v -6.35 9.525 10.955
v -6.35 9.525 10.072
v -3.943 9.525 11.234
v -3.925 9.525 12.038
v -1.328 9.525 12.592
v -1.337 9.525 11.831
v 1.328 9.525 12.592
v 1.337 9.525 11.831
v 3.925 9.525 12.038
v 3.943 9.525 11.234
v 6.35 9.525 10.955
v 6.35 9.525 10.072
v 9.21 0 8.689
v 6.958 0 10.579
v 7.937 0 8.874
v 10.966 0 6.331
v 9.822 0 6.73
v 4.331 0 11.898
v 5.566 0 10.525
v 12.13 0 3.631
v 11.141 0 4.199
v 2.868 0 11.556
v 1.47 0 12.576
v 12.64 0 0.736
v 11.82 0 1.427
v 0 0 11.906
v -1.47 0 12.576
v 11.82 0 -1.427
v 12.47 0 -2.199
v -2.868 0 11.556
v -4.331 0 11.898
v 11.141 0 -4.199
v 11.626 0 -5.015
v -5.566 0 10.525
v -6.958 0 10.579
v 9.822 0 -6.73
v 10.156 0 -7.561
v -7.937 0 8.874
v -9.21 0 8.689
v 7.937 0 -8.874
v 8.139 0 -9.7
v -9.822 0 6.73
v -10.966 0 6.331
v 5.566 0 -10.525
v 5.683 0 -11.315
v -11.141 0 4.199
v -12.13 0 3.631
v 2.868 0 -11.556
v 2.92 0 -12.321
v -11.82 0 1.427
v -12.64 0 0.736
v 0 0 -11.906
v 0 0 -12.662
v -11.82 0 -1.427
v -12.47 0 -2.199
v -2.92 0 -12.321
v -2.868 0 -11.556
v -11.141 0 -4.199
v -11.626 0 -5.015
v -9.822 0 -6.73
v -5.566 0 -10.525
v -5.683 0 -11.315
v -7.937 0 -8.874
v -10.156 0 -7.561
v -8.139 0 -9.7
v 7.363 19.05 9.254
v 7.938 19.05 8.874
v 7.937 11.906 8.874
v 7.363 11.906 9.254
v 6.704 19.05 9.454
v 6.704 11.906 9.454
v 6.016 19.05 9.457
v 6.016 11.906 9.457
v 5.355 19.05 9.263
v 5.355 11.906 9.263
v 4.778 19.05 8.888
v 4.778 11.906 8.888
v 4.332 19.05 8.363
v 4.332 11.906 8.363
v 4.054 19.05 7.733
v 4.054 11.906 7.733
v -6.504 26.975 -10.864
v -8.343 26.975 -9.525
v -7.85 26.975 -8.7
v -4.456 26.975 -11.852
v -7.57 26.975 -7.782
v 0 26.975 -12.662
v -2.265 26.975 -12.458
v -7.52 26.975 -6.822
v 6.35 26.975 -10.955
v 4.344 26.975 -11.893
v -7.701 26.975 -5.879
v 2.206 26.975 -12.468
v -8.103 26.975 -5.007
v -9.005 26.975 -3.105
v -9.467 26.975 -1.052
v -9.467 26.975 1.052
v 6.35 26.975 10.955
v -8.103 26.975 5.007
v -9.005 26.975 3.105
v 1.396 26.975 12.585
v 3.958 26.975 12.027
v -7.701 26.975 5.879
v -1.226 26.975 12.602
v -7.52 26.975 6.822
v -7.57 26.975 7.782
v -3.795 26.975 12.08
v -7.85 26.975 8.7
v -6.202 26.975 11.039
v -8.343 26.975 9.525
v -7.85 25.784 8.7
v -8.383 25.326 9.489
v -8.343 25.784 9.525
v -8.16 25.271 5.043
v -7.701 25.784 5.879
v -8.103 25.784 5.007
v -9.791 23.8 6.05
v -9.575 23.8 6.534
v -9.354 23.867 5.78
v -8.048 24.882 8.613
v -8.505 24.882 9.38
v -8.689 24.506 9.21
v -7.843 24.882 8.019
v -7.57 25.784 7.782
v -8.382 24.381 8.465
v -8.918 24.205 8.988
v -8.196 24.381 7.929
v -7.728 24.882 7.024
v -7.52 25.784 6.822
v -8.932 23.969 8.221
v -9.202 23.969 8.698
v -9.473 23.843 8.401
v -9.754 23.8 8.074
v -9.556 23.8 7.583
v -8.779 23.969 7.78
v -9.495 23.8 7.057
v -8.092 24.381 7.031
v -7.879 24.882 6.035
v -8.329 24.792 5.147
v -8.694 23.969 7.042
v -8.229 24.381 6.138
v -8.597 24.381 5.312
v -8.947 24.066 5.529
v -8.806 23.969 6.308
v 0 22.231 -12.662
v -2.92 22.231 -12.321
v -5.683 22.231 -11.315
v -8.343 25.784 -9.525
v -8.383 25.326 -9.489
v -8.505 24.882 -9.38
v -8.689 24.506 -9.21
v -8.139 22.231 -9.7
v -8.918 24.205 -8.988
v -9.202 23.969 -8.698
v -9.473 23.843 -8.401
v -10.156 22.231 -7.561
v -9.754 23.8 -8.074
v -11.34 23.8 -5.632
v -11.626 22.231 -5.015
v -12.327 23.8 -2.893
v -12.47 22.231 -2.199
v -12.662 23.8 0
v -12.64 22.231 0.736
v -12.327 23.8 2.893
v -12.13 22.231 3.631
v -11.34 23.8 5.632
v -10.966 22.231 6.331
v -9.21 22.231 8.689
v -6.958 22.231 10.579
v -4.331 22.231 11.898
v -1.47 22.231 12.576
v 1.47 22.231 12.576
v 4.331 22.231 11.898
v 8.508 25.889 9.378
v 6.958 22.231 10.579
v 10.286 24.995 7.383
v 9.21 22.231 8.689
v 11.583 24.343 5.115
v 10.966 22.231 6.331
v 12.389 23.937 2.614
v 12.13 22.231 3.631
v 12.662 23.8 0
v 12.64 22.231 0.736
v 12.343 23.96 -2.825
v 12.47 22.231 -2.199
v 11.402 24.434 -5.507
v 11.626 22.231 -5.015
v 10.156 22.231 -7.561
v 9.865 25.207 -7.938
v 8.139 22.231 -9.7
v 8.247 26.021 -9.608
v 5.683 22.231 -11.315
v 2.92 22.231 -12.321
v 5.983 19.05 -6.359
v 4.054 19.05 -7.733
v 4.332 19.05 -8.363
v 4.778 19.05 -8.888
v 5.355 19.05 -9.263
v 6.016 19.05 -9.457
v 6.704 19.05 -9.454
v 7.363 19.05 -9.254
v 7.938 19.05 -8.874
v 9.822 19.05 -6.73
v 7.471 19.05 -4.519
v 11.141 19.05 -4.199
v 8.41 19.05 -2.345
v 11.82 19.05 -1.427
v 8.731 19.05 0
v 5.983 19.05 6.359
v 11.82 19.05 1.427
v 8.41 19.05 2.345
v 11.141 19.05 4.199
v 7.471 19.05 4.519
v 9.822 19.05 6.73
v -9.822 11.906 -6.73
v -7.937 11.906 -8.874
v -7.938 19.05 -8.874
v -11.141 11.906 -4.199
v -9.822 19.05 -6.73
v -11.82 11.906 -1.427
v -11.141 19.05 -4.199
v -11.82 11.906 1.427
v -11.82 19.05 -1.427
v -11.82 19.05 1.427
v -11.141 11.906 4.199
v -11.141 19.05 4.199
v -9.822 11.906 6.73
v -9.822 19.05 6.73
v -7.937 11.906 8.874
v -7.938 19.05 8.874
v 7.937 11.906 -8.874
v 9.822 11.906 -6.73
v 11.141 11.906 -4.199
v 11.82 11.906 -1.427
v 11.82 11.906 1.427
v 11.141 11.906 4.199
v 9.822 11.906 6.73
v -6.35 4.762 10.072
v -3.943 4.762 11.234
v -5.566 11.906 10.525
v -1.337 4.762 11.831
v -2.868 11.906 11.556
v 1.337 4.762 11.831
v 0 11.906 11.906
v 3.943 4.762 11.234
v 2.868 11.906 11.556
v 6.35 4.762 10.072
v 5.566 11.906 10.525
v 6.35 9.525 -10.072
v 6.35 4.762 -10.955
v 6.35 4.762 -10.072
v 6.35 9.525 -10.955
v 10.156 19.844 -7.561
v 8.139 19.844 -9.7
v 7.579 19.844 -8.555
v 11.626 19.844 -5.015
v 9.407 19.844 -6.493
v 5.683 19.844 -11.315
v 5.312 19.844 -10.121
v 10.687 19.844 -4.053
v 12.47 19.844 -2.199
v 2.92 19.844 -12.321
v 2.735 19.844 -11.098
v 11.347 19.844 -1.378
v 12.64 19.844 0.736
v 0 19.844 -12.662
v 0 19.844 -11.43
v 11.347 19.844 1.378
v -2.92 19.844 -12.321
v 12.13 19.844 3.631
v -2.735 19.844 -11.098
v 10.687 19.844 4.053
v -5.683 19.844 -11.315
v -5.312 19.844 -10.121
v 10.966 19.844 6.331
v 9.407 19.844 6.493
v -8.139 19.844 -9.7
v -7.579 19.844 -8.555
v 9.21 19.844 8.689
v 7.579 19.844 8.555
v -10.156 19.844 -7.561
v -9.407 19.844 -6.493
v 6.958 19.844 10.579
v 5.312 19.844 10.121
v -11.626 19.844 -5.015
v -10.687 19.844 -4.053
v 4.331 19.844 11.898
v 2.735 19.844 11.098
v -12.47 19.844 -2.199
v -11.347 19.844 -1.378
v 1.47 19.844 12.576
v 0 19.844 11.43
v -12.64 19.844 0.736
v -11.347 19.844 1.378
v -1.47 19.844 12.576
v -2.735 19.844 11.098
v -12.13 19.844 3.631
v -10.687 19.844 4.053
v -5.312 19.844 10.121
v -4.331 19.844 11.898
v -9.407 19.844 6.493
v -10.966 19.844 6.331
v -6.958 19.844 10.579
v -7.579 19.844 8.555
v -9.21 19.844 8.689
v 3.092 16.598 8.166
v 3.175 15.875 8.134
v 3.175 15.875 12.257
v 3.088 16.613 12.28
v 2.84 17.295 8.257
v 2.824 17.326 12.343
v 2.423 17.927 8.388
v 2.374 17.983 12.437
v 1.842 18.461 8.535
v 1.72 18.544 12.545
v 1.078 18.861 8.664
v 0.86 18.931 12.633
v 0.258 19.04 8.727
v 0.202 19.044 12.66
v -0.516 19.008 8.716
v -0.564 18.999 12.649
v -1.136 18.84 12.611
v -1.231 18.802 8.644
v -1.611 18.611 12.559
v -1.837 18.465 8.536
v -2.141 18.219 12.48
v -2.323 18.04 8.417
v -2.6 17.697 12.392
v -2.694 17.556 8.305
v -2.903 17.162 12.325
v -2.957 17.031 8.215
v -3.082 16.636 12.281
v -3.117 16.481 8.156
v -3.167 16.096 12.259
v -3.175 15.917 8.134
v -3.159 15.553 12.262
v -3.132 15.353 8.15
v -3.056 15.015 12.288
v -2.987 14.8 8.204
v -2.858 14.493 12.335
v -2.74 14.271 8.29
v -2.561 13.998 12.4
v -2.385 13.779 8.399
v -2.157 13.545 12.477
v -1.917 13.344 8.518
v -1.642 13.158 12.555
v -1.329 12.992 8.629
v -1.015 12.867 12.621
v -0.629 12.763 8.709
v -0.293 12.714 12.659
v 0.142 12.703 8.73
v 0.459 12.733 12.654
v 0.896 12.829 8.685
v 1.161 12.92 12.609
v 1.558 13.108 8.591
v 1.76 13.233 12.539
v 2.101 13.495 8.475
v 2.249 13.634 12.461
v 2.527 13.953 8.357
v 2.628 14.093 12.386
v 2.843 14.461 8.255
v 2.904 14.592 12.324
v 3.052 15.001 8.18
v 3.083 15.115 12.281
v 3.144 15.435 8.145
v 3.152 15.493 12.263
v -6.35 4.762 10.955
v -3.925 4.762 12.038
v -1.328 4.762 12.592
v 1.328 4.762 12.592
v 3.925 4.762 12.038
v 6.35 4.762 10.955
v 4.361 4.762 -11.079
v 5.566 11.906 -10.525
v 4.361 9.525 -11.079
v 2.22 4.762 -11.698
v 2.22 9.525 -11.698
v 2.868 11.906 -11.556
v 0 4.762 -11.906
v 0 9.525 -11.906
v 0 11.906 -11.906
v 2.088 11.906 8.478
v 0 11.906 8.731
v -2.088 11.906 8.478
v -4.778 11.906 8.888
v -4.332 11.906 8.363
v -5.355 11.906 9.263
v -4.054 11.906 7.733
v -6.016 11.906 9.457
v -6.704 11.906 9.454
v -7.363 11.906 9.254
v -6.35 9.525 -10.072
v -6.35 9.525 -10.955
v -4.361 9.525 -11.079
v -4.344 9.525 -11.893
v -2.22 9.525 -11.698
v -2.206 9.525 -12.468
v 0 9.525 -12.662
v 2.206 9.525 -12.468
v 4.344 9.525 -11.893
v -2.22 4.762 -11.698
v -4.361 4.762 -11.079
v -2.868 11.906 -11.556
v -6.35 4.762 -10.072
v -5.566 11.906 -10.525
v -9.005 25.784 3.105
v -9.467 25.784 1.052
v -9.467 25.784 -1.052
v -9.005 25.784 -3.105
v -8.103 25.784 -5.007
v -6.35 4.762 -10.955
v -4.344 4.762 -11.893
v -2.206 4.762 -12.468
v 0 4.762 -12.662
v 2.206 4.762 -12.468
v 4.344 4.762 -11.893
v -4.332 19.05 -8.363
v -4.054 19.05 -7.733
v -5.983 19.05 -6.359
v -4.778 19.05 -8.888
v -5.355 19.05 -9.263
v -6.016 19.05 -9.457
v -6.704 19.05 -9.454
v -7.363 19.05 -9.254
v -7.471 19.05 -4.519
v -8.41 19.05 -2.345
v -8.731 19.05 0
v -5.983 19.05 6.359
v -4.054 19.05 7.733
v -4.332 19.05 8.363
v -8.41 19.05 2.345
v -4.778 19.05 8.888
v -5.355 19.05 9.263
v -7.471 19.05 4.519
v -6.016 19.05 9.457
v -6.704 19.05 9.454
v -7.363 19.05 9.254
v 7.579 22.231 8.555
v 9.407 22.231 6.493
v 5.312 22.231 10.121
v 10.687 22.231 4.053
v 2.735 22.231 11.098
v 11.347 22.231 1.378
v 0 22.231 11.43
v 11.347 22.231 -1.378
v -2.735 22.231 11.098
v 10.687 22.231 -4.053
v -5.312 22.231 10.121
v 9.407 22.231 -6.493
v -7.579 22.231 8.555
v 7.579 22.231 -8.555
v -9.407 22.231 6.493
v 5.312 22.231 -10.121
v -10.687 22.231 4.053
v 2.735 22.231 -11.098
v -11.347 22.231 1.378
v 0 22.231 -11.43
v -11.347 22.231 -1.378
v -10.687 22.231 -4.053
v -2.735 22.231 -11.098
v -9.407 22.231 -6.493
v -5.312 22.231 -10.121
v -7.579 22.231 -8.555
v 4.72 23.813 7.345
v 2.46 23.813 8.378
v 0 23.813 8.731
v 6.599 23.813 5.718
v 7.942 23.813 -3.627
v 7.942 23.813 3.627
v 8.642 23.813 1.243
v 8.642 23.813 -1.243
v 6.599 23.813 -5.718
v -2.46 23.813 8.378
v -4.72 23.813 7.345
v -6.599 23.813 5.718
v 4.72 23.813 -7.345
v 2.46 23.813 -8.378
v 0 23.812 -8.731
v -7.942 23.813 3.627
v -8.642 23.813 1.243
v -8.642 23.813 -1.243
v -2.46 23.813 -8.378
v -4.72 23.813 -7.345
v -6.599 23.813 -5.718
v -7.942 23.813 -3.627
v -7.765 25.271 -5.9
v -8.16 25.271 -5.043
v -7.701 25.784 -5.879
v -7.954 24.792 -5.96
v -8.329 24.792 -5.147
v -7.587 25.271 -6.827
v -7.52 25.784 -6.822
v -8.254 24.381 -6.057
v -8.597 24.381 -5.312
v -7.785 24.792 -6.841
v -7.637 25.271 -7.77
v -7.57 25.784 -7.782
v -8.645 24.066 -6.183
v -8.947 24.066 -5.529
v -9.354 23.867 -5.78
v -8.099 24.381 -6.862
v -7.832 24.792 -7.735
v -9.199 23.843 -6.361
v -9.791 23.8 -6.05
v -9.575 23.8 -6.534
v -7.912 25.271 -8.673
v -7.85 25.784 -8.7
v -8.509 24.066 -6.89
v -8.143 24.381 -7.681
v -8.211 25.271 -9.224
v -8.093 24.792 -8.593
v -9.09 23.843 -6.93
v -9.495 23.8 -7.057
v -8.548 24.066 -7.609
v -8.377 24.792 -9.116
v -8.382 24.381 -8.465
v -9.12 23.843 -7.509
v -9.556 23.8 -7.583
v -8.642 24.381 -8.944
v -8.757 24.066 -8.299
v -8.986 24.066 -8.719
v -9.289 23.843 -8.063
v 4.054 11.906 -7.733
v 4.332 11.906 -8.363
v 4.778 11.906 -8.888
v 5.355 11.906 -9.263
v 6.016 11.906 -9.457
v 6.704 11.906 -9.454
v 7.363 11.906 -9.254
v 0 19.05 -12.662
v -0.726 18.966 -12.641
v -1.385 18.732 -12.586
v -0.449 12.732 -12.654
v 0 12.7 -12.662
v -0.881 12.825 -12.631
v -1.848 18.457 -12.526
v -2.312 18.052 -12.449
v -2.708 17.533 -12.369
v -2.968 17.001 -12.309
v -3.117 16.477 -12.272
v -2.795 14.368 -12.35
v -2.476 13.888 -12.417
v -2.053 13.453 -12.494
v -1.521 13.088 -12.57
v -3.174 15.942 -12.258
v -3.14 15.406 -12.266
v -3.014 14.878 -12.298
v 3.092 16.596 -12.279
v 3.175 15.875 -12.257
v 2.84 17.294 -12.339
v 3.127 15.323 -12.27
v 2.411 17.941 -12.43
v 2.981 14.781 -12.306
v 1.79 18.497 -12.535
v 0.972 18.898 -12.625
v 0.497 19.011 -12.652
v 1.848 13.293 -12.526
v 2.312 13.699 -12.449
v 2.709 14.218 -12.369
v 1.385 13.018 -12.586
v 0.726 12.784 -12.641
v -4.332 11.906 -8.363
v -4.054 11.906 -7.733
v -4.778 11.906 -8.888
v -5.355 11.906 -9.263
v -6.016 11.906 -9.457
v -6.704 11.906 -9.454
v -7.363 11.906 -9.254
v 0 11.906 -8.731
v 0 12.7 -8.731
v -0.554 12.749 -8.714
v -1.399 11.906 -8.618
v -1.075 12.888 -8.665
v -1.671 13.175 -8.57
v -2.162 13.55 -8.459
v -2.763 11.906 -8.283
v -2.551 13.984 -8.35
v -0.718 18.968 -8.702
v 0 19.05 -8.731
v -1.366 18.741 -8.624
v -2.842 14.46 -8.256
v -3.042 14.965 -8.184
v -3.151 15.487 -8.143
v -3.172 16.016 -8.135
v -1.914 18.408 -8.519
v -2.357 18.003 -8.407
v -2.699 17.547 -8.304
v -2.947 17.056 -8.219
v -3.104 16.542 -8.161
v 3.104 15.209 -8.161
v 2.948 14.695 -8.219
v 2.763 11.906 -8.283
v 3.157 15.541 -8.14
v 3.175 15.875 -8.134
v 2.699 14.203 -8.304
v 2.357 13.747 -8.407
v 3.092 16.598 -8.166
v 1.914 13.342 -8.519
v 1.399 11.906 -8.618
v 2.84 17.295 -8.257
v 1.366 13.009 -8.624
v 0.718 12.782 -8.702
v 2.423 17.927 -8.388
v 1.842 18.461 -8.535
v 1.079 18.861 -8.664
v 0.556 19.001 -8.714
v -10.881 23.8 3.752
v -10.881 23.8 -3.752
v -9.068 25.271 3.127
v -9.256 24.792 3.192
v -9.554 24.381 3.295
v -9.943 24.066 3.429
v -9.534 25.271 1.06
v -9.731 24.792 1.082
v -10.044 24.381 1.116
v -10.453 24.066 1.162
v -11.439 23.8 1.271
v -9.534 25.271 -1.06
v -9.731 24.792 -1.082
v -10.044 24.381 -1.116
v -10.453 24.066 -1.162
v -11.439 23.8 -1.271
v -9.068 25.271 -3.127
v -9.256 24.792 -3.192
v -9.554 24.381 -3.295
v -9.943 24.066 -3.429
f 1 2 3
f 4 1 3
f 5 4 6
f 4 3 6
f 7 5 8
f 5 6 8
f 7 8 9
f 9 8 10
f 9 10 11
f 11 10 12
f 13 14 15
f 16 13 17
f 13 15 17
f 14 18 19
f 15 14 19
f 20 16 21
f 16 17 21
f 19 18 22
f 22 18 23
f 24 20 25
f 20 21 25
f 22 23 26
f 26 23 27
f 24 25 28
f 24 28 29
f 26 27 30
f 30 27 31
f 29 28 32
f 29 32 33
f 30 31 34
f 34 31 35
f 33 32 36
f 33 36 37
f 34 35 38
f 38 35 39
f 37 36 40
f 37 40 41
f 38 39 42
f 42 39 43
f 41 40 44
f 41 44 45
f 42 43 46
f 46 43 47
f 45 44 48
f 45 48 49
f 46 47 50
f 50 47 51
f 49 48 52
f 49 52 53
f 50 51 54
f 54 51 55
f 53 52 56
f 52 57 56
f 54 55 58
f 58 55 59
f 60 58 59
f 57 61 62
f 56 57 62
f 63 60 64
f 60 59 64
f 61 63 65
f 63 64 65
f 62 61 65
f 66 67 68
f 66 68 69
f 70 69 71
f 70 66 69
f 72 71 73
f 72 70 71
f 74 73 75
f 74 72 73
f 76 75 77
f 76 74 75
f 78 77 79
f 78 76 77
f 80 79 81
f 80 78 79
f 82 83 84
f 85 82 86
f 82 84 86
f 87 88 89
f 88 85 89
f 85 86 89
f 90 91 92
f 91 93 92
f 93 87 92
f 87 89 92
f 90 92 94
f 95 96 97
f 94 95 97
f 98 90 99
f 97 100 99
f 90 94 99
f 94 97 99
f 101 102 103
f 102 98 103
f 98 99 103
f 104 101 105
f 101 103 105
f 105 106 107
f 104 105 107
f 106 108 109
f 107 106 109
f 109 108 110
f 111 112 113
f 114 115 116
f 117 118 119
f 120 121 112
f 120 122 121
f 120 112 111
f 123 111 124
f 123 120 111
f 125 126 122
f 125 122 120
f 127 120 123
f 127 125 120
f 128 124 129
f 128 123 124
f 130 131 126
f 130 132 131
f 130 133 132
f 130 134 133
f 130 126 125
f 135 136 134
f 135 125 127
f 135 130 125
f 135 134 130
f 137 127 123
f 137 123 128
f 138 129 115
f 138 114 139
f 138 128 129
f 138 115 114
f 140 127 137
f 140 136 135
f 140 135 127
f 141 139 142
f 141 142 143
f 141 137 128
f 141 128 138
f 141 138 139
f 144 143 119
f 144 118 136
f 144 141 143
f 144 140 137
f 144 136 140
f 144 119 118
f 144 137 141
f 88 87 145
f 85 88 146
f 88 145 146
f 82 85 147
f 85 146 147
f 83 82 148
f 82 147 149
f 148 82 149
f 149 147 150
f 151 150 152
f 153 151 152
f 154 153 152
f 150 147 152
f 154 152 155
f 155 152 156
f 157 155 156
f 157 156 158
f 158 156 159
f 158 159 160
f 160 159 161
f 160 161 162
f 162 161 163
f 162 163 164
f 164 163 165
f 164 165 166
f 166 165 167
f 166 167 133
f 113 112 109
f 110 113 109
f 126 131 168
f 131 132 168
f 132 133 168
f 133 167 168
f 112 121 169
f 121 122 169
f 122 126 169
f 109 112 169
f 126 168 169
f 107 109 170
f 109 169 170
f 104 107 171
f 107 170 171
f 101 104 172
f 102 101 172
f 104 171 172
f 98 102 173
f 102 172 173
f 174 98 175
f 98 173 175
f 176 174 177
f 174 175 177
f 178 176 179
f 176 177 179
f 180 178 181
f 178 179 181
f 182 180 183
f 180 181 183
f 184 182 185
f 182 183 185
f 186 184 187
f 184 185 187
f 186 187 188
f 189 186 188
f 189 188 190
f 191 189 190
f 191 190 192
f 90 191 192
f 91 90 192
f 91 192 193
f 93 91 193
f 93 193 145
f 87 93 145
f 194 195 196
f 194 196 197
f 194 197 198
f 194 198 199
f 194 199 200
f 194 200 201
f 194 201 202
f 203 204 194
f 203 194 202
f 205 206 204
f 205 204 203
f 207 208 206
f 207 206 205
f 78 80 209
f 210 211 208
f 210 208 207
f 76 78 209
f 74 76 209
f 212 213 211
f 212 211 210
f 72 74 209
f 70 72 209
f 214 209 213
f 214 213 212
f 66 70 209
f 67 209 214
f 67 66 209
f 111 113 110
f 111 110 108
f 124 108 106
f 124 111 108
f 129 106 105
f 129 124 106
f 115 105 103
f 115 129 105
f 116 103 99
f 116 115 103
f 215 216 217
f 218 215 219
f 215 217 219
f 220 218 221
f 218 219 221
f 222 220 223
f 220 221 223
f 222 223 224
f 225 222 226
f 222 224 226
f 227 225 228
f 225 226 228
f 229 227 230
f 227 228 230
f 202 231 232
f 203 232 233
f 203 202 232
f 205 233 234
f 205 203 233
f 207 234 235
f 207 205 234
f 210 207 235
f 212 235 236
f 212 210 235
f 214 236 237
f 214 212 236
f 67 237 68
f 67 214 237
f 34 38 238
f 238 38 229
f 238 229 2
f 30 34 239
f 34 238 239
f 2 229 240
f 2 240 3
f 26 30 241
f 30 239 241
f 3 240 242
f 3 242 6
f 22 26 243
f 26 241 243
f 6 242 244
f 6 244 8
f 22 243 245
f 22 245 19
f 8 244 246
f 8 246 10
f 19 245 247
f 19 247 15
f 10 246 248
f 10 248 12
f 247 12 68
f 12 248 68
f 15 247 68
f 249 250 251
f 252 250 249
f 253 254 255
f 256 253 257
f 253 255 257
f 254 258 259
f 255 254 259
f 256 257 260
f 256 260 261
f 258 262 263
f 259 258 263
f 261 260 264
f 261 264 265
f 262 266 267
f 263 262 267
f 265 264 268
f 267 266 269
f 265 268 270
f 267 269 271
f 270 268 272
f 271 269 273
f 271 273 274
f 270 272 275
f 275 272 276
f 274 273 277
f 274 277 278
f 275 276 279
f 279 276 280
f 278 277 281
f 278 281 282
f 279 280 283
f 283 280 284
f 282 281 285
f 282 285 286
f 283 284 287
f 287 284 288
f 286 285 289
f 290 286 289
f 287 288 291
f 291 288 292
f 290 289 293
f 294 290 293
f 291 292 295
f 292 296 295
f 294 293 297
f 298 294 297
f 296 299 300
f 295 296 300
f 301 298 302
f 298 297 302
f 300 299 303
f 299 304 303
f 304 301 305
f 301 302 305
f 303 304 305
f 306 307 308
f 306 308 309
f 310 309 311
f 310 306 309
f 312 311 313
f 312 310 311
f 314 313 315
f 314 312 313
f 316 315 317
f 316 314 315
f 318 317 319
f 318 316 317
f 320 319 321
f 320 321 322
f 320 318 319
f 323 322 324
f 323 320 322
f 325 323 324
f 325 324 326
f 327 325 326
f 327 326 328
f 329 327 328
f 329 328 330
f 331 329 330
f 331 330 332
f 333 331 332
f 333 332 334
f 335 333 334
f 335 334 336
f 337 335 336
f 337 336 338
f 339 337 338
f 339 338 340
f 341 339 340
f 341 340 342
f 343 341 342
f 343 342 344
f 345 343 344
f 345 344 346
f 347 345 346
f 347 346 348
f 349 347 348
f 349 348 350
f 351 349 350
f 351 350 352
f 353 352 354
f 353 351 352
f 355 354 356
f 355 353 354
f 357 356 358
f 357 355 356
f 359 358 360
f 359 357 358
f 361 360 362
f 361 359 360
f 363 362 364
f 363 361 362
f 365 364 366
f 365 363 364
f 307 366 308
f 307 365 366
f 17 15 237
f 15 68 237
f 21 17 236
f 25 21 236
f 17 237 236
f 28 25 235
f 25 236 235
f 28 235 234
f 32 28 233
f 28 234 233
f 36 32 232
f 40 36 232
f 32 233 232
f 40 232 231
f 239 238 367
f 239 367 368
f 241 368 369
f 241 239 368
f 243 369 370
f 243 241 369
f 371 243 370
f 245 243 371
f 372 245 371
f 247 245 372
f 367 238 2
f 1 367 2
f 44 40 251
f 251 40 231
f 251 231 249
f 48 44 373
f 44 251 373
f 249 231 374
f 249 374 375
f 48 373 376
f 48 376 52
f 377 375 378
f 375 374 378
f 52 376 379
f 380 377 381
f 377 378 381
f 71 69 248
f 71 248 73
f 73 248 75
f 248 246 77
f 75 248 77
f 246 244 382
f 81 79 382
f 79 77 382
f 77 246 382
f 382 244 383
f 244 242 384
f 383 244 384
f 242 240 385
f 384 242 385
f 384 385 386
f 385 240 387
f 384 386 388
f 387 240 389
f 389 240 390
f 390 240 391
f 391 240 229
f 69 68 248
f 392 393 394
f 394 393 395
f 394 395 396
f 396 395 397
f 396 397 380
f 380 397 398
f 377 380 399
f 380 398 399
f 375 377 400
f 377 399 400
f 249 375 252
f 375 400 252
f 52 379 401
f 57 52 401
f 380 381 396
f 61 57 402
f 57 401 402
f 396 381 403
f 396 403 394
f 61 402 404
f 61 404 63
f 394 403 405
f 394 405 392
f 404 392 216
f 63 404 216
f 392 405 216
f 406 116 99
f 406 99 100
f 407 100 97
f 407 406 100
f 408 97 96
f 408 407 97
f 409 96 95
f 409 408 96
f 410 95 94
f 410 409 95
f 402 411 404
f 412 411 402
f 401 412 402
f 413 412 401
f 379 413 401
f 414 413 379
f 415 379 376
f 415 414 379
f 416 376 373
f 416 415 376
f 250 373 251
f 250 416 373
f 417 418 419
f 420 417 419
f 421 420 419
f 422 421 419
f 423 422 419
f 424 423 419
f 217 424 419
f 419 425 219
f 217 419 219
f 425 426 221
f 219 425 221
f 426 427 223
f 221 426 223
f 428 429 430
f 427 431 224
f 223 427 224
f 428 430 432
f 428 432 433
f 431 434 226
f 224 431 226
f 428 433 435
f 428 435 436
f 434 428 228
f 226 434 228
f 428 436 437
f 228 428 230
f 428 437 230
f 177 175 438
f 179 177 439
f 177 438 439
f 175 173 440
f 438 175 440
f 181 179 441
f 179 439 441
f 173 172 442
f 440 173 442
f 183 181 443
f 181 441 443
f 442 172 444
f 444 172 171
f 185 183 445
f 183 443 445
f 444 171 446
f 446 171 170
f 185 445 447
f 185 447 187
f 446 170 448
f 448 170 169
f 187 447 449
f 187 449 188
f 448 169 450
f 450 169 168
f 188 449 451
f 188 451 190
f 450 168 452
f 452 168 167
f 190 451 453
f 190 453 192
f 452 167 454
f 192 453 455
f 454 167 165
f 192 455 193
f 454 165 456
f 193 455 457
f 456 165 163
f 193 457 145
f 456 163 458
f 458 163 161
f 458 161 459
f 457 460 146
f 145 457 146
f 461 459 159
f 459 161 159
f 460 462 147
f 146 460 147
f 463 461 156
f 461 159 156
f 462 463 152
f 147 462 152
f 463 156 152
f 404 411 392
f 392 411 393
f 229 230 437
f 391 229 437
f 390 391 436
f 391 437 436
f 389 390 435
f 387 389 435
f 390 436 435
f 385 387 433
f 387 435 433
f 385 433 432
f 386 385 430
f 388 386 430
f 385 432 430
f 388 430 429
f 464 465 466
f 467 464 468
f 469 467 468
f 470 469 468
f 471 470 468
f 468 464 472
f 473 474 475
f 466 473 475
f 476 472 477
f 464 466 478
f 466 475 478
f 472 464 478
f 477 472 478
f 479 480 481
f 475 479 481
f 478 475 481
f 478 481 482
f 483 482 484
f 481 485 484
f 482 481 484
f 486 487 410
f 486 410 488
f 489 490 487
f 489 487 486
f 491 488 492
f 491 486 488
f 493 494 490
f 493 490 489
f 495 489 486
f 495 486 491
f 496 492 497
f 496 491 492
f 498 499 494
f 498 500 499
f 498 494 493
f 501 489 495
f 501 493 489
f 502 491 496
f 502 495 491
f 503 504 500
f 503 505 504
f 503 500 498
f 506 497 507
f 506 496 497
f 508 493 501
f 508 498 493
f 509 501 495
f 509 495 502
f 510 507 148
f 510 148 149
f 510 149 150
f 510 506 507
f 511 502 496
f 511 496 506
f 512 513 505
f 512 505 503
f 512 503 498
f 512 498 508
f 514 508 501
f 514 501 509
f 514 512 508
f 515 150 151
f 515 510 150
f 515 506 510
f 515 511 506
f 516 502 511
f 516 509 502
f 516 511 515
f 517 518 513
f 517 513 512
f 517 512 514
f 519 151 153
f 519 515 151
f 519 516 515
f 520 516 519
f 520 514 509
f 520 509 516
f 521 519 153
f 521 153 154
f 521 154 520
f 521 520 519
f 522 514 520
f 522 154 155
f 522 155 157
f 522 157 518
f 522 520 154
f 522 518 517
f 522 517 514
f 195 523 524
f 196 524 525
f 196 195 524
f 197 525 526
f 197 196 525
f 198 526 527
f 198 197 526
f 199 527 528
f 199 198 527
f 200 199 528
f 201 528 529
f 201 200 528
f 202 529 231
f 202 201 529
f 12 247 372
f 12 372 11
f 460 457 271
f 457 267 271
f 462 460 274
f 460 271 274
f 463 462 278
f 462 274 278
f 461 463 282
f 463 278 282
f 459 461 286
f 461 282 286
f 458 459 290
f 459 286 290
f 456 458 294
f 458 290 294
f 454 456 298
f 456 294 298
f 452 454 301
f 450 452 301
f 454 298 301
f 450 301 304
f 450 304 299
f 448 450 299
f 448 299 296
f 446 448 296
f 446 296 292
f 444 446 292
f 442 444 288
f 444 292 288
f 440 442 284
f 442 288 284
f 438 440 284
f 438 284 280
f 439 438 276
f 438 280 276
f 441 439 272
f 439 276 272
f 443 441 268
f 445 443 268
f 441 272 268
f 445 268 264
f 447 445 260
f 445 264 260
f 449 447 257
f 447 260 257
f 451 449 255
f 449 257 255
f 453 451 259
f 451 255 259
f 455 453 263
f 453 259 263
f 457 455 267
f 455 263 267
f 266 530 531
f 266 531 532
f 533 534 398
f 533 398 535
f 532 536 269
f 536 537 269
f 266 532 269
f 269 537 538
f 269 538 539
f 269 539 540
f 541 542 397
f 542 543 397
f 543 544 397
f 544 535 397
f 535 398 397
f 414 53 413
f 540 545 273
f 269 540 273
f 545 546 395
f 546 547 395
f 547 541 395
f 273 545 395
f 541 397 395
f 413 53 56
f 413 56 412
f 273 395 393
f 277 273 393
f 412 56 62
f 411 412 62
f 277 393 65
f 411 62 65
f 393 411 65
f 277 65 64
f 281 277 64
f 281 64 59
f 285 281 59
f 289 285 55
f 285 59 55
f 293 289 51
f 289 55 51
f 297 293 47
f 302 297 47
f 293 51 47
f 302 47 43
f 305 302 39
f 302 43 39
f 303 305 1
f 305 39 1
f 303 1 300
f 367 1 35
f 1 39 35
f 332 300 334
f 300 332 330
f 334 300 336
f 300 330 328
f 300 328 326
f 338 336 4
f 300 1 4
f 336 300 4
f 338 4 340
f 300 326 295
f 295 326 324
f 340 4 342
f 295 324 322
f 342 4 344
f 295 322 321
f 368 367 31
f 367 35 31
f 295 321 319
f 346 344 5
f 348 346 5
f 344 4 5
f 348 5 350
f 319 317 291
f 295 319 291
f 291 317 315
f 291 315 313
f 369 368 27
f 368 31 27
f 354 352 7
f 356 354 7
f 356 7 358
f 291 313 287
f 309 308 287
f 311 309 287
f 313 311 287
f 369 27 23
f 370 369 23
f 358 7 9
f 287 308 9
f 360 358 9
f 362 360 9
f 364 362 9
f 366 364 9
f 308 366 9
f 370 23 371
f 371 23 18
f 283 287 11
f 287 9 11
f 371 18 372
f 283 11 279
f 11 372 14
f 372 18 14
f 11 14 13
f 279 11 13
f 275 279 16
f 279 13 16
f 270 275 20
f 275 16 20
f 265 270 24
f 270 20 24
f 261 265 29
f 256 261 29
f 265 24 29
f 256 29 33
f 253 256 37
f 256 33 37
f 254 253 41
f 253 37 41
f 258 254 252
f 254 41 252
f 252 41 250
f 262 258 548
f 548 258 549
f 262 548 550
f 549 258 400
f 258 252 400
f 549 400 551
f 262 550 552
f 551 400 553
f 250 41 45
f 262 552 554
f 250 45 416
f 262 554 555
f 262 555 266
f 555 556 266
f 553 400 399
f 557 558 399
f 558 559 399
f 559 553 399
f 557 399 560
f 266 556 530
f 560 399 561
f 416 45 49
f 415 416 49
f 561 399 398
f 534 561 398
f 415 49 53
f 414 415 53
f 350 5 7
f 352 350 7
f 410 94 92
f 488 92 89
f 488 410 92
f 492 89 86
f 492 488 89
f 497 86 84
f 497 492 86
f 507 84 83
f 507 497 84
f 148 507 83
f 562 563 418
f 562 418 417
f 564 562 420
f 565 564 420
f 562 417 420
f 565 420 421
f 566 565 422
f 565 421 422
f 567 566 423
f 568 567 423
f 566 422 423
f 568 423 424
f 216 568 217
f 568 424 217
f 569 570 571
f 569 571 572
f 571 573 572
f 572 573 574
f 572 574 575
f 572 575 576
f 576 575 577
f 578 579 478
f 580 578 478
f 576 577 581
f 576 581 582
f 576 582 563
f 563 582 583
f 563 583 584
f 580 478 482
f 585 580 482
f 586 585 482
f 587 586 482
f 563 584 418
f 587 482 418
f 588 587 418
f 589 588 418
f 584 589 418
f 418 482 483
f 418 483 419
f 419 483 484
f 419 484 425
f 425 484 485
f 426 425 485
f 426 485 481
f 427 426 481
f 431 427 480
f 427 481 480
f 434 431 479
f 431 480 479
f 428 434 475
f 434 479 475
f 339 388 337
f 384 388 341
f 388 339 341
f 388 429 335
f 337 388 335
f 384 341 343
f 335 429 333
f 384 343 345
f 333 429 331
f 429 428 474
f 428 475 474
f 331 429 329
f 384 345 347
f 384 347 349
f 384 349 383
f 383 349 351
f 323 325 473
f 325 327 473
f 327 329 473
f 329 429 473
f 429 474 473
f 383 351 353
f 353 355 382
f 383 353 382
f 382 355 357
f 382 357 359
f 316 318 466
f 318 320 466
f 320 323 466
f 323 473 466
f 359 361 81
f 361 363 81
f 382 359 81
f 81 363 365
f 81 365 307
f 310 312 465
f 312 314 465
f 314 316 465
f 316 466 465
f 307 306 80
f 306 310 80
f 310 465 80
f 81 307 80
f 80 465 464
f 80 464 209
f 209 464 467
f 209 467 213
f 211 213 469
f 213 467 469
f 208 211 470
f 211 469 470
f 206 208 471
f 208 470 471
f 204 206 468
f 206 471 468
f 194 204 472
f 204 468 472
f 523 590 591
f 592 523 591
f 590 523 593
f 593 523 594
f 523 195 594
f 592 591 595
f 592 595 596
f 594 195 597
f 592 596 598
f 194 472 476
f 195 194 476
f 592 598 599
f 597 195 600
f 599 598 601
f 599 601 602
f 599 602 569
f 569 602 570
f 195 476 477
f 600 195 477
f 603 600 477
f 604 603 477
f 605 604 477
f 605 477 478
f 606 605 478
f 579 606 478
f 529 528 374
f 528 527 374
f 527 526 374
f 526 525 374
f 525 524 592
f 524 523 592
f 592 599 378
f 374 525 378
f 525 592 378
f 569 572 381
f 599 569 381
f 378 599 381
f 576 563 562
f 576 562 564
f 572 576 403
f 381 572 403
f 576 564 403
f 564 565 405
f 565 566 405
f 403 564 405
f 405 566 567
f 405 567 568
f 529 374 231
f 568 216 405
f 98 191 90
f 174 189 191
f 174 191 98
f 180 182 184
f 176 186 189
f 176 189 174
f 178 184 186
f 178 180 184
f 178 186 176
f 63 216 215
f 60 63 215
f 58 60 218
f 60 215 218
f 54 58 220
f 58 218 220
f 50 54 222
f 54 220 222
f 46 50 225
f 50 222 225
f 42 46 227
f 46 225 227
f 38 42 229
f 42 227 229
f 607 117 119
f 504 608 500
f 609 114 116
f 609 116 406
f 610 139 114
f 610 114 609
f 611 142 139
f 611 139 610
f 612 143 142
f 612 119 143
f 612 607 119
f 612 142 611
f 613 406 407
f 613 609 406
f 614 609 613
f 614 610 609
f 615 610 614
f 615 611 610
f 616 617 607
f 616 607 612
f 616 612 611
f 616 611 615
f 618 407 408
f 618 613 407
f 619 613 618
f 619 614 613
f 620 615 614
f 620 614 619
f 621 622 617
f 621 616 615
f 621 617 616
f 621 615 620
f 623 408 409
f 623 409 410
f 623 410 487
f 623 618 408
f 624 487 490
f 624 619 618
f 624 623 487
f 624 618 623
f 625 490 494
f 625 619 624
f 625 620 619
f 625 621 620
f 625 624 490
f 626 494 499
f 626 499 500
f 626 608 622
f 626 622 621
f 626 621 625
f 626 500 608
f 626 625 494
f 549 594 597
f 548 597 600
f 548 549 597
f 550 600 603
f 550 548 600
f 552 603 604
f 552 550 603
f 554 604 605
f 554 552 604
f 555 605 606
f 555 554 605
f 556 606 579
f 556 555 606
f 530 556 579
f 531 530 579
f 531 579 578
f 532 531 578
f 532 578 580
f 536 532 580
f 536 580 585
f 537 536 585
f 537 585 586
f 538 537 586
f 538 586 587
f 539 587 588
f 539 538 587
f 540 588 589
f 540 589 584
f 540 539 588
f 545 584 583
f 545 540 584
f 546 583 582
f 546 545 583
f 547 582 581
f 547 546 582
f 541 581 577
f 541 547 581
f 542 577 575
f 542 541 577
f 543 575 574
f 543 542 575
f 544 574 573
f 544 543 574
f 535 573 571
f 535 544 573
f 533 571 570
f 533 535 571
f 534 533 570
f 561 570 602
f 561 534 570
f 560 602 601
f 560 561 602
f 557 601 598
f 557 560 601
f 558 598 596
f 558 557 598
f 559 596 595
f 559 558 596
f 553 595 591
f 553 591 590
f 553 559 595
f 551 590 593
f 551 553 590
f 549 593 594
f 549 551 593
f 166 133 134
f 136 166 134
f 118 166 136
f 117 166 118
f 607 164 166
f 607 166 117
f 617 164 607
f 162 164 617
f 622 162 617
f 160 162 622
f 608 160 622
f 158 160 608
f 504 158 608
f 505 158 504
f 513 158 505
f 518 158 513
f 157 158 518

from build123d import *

# Parameters (mm, degrees)
CUT_EXTRUDE1_DEPTH      = 33.377264527
CUT_EXTRUDE1_DEPTH_BACK = 33.377264527
SKETCH13_R              = 3.175
CUT_EXTRUDE2_DEPTH      = 33.377264605
CUT_EXTRUDE2_DEPTH_BACK = 33.377264605
SKETCH14_W              = 12.7
SKETCH14_H              = 4.7625
CUT_EXTRUDE3_DEPTH      = 33.377264605
CUT_EXTRUDE3_DEPTH_BACK = 19.05
CUT_EXTRUDE5_START      = -3.175
CUT_EXTRUDE5_DEPTH      = 3.175
FILLET3_R               = 1.984375
CUT_EXTRUDE4_DEPTH      = 46.545358174


with BuildPart() as part:
    # Sketch1 → Revolve1 (revolve)
    with BuildSketch(Plane.XY, mode=Mode.PRIVATE) as revolve1_sk:
        Polygon((0, 26.9748), (12.6619, 26.9748), (12.6619, 22.23135), (11.43, 22.23135), (11.43, 19.84375), (12.6619, 19.84375), (12.6619, 0), (11.90625, 0), (11.90625, 11.90625), (8.73125, 11.90625), (8.73125, 23.8125), (0, 23.8125), align=None)
    revolve(revolve1_sk.sketch.rotate(Axis((0, -1015.176230553, 0), (0, 1, 0)), 90), axis=Axis((0, -1015.176230553, 0), (0, 1, 0)))

    # Sketch13 → Cut-Extrude1 (cut, two sides: drawn at the far end of the back side and taken through both)
    with BuildSketch(Plane.XY.offset(-CUT_EXTRUDE1_DEPTH_BACK)):
        with Locations((0, 15.875)):
            Circle(SKETCH13_R)
    extrude(amount=CUT_EXTRUDE1_DEPTH + CUT_EXTRUDE1_DEPTH_BACK, mode=Mode.SUBTRACT)

    # Sketch14 → Cut-Extrude2 (cut, two sides: drawn at the far end of the back side and taken through both)
    with BuildSketch(Plane.XY.offset(-CUT_EXTRUDE2_DEPTH_BACK)):
        with Locations((0, 7.14375)):
            Rectangle(SKETCH14_W, SKETCH14_H)
    extrude(amount=CUT_EXTRUDE2_DEPTH + CUT_EXTRUDE2_DEPTH_BACK, mode=Mode.SUBTRACT)

    # Sketch15 → Cut-Extrude3 (cut, two sides: drawn at the far end of the back side and taken through both)
    with BuildSketch(Plane.XZ.offset(-CUT_EXTRUDE3_DEPTH_BACK)):
        with BuildLine():
            ThreePointArc((7.9375, 8.874394786), (4.575121043, 8.687015829), (4.7625, 5.324636871))
            ThreePointArc((4.7625, 5.324636871), (7.14375, 0), (4.7625, -5.324636871))
            ThreePointArc((4.7625, -5.324636871), (4.575121043, -8.687015829), (7.9375, -8.874394786))
            ThreePointArc((7.9375, -8.874394786), (11.90625, 0), (7.9375, 8.874394786))
        make_face()
        with BuildLine():
            ThreePointArc((-4.7625, 5.324636871), (-7.14375, 0), (-4.7625, -5.324636871))
            ThreePointArc((-4.7625, -5.324636871), (-4.575121043, -8.687015829), (-7.9375, -8.874394786))
            ThreePointArc((-7.9375, -8.874394786), (-11.90625, 0), (-7.9375, 8.874394786))
            ThreePointArc((-7.9375, 8.874394786), (-4.575121043, 8.687015829), (-4.7625, 5.324636871))
        make_face()
    extrude(amount=CUT_EXTRUDE3_DEPTH + CUT_EXTRUDE3_DEPTH_BACK, mode=Mode.SUBTRACT)

    # Sketch16 → Cut-Extrude5 (cut)
    with BuildSketch(Plane(origin=(0, 26.9748, 0), x_dir=(1, 0, 0), z_dir=(0, 1, 0)).offset(CUT_EXTRUDE5_START)):
        with BuildLine():
            ThreePointArc((-8.102829044, 5.006973784), (-7.515832375, 7.303491278), (-8.34254677, 9.525))
            ThreePointArc((-8.34254677, 9.525), (-12.6619, 0), (-8.34254677, -9.525))
            ThreePointArc((-8.34254677, -9.525), (-7.515832375, -7.303491278), (-8.102829044, -5.006973784))
            ThreePointArc((-8.102829044, -5.006973784), (-9.525, 0), (-8.102829044, 5.006973784))
        make_face()
    extrude(amount=CUT_EXTRUDE5_DEPTH, mode=Mode.SUBTRACT)

    # Fillet3
    fillet3_edges = [part.edges().sort_by_distance(p)[0] for p in [
        (-7.515832375, 23.7998, 7.303491278),
        (-7.515832375, 23.7998, -7.303491278),
        (-9.525, 23.7998, 0),
    ]]
    fillet(fillet3_edges, radius=FILLET3_R)

    # 3DSketch2 → Cut-Extrude4 (cut, through all, along a direction that is not the sketch's normal)
    with BuildSketch(Plane(origin=(6.35, 26.9748, -10.954506452), x_dir=(0.2724106821506037, -0.13702750611197365, 0.9523738146436912), z_dir=(0.4493692675606063, 0.8933461039104856, 0))):
        Polygon((0, 0), (20.865570195, -6.68078041), (23.170530429, 0), (2.004022399, 6.777135294), align=None)
    extrude(amount=CUT_EXTRUDE4_DEPTH, dir=(0, 1, 0), mode=Mode.SUBTRACT)


solid = part.part
